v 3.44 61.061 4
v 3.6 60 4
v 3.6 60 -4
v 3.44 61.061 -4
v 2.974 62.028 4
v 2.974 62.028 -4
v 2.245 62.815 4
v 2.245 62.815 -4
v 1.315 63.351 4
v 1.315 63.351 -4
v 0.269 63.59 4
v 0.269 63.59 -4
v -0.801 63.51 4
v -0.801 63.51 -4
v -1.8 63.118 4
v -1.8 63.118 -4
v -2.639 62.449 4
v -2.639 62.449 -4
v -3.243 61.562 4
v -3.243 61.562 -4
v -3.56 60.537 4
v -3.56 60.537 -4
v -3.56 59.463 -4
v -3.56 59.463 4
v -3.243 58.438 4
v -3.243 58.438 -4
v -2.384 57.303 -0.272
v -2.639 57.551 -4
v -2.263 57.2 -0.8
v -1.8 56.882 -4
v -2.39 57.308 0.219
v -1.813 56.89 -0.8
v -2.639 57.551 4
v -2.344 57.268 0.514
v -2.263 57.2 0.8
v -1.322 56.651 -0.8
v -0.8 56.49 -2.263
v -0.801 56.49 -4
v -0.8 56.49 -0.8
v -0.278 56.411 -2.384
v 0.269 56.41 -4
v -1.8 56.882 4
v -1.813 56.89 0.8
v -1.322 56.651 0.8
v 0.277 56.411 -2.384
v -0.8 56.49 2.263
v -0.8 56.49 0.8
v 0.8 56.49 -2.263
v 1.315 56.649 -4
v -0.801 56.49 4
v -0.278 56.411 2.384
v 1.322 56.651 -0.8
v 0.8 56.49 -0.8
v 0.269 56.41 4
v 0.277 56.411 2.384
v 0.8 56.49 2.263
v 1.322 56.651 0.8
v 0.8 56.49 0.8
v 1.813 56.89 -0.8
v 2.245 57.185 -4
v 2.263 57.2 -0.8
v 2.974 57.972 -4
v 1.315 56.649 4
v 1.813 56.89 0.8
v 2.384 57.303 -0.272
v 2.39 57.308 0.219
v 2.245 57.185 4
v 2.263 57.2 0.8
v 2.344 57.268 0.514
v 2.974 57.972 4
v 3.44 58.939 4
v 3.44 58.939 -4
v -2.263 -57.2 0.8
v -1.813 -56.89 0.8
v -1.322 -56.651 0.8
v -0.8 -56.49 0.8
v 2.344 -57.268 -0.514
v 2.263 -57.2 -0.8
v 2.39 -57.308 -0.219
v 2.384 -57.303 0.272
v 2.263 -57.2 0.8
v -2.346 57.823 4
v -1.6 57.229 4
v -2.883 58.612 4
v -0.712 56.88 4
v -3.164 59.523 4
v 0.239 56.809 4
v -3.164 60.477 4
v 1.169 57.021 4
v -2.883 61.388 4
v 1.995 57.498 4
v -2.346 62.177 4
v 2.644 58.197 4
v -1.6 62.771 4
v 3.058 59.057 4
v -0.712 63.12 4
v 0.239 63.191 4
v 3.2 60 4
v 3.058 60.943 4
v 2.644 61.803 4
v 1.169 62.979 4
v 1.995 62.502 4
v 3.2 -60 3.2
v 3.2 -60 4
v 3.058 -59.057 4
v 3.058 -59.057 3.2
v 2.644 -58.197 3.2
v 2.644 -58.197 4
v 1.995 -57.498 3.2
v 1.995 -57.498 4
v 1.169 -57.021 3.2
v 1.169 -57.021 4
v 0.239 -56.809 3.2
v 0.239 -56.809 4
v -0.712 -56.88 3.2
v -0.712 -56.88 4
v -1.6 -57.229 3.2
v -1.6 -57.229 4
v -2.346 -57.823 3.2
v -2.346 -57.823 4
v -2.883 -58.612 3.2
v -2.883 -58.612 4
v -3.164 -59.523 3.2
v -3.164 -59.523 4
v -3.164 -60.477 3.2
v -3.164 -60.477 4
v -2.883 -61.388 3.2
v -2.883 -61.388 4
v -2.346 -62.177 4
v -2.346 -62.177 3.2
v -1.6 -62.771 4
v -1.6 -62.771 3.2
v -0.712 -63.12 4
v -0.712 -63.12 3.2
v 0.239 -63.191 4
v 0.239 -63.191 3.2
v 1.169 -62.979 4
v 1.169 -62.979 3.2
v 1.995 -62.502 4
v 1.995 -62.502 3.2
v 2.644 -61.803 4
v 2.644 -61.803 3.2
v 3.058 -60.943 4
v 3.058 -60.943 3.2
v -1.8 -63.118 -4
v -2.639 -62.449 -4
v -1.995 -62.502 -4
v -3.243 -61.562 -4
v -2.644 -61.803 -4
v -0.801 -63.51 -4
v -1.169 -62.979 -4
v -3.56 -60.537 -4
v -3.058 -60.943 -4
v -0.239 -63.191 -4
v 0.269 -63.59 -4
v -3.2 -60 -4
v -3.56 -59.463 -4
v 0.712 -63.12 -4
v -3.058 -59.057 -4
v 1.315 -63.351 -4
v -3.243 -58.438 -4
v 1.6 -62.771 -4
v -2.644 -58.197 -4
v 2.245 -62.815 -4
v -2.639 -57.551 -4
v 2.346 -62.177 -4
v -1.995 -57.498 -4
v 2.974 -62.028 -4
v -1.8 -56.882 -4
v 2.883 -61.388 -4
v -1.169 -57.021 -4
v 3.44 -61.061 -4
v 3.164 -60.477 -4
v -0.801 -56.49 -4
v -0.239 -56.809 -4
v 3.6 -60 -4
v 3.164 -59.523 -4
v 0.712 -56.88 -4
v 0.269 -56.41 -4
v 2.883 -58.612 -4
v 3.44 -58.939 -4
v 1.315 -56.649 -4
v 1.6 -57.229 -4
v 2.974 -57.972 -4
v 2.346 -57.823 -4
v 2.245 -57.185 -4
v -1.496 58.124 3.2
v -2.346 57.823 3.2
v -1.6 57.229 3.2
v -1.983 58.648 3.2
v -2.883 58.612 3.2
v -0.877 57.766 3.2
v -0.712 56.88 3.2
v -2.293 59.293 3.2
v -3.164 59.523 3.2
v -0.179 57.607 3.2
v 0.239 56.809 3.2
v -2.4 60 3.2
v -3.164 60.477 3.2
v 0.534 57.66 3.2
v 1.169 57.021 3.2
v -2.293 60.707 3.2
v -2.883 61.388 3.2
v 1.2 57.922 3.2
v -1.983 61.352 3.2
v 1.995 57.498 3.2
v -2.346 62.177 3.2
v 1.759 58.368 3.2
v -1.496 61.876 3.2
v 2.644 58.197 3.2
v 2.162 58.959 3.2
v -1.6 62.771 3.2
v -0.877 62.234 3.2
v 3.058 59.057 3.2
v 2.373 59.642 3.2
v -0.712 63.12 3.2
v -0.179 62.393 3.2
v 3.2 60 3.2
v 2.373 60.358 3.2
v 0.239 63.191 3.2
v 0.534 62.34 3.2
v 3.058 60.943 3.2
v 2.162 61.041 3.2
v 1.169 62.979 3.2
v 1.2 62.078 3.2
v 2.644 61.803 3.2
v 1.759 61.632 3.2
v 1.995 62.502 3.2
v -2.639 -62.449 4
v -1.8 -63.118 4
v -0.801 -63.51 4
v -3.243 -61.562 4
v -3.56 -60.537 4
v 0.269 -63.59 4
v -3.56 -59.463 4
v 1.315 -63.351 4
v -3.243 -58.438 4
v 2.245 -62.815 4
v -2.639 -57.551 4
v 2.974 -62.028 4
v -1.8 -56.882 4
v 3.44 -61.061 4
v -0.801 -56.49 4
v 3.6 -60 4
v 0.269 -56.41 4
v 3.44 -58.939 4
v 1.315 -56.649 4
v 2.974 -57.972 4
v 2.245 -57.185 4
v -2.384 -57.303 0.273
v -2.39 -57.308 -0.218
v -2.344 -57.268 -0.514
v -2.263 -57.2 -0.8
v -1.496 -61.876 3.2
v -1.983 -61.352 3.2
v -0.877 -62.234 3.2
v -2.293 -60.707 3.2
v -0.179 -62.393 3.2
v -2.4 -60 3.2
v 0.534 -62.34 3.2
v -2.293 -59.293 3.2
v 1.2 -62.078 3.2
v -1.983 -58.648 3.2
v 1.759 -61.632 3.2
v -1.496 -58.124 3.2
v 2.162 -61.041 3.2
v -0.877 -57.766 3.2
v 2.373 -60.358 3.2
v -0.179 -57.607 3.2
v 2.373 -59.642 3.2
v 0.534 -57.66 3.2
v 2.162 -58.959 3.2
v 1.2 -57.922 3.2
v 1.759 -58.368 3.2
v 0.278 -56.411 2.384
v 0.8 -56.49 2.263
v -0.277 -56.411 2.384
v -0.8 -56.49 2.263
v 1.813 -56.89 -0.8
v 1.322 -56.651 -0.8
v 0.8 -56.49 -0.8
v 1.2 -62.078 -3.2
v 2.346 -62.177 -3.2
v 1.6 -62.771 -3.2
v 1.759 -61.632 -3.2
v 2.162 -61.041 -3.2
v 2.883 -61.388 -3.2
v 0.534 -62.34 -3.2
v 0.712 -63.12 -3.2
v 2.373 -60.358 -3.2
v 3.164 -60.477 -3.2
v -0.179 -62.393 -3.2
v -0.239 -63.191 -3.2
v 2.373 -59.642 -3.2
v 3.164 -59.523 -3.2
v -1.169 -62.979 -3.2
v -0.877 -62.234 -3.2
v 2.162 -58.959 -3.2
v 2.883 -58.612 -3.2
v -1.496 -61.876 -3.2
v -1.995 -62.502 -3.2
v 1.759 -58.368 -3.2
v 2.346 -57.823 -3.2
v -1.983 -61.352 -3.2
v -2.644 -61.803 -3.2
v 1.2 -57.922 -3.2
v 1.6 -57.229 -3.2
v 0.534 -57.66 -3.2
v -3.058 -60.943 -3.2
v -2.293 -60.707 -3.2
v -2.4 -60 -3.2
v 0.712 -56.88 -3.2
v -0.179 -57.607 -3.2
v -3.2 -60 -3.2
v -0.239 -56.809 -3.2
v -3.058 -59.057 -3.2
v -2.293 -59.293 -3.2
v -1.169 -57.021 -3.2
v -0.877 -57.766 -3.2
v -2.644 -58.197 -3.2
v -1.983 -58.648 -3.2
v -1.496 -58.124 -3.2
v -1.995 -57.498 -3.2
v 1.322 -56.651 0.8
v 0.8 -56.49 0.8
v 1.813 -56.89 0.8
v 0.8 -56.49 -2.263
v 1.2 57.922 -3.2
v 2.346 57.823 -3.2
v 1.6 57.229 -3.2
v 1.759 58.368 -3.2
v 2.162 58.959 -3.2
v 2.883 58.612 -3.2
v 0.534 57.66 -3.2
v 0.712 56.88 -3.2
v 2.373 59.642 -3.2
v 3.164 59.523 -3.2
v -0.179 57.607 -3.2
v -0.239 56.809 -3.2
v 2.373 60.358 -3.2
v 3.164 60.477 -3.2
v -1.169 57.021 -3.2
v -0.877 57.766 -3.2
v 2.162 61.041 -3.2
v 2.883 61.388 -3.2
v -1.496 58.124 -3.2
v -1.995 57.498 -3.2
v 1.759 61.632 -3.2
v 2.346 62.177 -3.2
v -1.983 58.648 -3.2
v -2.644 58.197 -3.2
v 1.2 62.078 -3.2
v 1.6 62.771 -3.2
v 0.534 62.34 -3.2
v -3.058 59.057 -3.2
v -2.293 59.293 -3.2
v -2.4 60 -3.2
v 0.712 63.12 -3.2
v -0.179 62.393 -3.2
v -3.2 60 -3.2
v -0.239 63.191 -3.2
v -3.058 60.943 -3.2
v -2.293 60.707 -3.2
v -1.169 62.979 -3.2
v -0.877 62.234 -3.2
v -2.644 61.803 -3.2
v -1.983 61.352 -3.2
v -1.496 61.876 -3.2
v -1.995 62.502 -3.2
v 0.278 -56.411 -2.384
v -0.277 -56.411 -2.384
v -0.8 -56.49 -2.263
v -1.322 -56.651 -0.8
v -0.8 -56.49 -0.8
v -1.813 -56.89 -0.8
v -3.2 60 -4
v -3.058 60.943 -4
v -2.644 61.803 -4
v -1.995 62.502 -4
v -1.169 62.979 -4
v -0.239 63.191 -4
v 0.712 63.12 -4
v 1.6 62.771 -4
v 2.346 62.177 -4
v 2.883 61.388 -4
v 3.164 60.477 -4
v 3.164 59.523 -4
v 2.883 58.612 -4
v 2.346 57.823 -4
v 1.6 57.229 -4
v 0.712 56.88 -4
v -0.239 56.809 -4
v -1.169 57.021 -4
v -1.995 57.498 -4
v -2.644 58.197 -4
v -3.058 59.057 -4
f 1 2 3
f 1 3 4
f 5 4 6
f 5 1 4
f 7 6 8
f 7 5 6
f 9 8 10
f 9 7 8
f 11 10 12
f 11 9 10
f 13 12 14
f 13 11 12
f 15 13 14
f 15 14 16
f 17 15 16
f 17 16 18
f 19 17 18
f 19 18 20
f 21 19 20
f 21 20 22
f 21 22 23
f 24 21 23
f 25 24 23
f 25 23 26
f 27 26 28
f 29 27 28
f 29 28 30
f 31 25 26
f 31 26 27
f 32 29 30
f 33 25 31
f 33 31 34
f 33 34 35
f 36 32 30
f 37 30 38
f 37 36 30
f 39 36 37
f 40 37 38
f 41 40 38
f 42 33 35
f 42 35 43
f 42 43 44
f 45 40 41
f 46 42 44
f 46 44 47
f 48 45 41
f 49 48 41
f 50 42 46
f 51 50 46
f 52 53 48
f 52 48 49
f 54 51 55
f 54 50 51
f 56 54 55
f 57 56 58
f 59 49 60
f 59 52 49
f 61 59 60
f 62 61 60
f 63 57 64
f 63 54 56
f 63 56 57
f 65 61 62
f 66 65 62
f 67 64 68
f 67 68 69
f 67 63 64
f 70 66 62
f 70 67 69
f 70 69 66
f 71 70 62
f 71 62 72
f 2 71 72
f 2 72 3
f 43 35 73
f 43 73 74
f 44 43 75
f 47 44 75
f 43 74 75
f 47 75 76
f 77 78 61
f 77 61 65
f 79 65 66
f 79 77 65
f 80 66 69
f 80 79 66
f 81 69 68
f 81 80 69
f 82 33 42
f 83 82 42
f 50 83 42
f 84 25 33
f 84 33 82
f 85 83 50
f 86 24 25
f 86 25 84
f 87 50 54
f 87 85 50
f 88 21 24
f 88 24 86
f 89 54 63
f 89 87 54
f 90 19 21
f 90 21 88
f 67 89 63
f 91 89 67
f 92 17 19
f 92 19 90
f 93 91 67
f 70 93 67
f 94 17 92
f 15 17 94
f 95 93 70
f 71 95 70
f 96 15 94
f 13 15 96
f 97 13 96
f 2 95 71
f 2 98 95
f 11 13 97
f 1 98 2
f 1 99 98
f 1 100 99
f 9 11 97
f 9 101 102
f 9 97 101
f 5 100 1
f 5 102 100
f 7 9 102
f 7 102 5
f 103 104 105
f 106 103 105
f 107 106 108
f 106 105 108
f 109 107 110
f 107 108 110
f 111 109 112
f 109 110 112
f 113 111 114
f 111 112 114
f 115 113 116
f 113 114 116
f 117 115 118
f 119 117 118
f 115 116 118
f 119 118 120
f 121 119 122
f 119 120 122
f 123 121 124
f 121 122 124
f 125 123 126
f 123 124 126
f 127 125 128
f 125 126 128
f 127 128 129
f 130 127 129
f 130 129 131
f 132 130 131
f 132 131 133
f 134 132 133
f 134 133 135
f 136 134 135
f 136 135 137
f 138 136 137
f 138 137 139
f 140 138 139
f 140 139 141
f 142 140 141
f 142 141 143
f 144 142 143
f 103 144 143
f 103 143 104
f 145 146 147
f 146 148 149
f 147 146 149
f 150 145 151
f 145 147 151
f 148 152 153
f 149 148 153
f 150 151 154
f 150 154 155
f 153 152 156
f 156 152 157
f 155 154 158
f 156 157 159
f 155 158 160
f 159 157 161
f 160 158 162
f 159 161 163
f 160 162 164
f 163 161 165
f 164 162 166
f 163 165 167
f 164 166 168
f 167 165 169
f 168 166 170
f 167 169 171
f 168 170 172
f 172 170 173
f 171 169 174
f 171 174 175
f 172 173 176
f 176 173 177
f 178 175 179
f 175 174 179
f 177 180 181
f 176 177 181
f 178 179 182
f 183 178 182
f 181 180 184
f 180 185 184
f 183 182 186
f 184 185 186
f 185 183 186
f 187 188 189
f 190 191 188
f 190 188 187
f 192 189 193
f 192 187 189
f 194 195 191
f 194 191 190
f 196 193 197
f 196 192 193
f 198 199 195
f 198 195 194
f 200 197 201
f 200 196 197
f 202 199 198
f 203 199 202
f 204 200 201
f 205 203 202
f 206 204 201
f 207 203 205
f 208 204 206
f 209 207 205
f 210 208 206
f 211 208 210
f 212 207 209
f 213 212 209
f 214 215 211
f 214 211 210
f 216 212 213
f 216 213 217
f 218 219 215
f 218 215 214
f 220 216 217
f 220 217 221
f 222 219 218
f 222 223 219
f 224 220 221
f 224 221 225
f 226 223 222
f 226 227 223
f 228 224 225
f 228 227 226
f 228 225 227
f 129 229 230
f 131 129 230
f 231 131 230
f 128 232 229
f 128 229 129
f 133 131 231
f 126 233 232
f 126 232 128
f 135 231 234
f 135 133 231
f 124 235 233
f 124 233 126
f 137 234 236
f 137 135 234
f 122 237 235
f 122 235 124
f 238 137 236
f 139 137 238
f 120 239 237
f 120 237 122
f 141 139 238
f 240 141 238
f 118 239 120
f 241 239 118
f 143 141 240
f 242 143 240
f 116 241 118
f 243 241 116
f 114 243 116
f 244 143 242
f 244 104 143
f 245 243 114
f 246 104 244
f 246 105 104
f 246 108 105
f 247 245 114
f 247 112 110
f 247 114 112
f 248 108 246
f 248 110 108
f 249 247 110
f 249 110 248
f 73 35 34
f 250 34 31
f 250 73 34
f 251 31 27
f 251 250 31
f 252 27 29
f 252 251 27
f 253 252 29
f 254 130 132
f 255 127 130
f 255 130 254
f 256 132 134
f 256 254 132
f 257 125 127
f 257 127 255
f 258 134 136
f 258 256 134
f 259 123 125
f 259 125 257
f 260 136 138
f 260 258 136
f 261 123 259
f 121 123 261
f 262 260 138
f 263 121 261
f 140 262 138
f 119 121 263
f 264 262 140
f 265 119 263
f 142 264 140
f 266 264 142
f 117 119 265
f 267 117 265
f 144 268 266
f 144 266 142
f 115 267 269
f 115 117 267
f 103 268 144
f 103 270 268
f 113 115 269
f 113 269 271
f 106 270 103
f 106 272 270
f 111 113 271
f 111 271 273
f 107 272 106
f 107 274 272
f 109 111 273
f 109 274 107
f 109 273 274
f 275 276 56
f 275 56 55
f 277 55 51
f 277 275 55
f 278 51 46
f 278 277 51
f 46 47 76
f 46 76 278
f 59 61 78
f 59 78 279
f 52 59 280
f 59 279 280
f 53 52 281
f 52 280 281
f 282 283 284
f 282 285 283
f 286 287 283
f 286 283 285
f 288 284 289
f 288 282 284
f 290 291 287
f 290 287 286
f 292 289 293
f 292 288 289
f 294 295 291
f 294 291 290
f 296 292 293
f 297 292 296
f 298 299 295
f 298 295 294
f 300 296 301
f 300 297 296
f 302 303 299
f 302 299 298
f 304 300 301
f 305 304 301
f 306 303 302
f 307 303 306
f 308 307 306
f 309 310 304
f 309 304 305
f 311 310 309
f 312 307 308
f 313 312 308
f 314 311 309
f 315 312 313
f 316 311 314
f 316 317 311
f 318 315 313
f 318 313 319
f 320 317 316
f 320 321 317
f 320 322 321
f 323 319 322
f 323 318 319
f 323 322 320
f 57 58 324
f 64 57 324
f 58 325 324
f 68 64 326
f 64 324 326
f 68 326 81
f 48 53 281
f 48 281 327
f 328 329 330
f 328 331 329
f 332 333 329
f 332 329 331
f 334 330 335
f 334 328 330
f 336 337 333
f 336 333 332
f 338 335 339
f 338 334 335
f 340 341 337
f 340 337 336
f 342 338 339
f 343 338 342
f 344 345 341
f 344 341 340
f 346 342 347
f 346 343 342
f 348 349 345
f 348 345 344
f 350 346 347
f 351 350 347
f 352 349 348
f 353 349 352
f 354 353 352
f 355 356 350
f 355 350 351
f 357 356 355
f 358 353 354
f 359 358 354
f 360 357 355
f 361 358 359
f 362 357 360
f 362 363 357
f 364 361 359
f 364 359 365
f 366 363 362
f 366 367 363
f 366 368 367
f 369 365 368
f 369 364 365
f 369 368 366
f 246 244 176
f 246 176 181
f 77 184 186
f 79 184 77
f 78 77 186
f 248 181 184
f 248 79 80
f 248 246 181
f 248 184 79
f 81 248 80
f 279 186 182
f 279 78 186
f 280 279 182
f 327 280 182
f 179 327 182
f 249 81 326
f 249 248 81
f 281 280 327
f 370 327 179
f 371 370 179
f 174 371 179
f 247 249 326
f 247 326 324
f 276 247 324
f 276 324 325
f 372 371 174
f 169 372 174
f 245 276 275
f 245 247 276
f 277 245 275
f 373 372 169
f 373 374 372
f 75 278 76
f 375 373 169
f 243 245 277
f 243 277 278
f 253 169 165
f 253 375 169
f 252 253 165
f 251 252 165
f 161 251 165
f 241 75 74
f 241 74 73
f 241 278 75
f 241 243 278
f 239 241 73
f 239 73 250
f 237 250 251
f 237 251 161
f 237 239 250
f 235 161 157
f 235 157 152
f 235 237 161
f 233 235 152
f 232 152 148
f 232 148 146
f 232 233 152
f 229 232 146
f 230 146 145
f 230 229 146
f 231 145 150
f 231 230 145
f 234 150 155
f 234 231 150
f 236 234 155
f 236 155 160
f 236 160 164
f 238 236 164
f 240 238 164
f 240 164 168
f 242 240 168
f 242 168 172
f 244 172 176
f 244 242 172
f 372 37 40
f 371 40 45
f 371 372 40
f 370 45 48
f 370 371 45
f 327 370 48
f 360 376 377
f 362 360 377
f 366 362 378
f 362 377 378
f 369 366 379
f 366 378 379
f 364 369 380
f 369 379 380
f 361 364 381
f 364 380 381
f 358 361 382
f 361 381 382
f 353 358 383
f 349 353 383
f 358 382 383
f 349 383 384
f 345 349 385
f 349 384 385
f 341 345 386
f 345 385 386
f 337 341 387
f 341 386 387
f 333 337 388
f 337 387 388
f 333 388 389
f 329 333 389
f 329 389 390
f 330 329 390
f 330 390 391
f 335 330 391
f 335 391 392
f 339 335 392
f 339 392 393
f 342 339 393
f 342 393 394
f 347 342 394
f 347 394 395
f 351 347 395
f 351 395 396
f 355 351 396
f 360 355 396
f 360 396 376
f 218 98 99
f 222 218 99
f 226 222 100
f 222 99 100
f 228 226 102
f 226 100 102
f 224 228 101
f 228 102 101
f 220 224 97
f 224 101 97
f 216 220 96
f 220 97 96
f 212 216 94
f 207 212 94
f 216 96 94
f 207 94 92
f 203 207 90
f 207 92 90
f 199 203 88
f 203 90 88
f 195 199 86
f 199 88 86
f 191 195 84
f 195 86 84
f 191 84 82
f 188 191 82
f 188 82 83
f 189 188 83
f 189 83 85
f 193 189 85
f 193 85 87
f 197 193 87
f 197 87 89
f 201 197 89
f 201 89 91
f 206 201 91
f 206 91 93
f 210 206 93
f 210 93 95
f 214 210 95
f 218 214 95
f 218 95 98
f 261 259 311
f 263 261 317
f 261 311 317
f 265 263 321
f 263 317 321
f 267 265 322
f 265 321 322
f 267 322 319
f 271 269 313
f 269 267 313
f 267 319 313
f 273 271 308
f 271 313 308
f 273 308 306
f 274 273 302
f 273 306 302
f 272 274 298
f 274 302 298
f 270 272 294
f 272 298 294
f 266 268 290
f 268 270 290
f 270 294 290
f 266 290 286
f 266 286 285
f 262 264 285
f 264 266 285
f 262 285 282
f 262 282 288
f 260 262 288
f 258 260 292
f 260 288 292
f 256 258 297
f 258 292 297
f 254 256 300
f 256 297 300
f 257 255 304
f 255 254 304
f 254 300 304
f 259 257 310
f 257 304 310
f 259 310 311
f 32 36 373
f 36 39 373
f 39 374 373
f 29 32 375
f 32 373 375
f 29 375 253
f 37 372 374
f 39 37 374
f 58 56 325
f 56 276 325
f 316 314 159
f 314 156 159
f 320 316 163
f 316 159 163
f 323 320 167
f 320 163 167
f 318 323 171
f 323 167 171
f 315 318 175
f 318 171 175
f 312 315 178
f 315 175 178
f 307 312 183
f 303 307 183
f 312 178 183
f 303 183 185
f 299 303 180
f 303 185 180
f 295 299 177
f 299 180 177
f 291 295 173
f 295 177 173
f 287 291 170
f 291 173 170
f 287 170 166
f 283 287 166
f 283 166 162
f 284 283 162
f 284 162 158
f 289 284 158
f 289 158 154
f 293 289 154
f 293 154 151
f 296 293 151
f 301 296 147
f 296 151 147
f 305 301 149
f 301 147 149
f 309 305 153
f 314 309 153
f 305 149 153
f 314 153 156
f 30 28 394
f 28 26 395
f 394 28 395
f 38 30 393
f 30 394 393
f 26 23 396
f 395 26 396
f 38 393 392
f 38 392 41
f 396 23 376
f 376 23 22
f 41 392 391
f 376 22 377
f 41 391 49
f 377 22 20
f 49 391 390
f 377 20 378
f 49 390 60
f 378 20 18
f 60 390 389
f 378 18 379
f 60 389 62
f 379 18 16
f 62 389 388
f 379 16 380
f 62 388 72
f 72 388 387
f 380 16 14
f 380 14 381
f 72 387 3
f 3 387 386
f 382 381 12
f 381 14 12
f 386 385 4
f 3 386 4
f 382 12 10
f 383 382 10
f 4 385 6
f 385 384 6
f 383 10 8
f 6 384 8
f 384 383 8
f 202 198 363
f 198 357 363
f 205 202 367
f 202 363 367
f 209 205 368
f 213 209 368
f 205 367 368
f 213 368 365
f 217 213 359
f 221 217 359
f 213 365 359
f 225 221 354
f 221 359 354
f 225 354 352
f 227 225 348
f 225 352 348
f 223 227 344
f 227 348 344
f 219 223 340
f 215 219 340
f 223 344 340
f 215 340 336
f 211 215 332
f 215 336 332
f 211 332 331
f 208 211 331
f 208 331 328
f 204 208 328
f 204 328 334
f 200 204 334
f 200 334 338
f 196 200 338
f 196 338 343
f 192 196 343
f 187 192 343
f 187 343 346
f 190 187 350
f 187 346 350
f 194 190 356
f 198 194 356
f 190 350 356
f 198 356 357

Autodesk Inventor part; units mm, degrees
ref_plane "YZ Plane" through (0, 0, 0) normal (1, 0, 0) x (0, 1, 0)
ref_plane "XZ Plane" through (0, 0, 0) normal (0, 1, 0) x (-1, 0, 0)
ref_plane "XY Plane" through (0, 0, 0) normal (0, 0, 1) x (1, 0, 0)
sketch "Sketch2" plane through (0, 0, 0) normal (0, 1, 0) x (-1, 0, 0)
  circle A0 centre (0, 0) radius 2.4 construction
  line L0 (-0.8, 2.2627) -> (-0.8, 0.8)
  line L1 (-0.8, 0.8) -> (-2.2627, 0.8)
  line L2 (-2.2627, -0.8) -> (-0.8, -0.8)
  line L3 (-0.8, -0.8) -> (-0.8, -2.2627)
  line L4 (0.8, -2.2627) -> (0.8, -0.8)
  line L5 (0.8, -0.8) -> (2.2627, -0.8)
  line L6 (2.2627, 0.8) -> (0.8, 0.8)
  line L7 (0.8, 0.8) -> (0.8, 2.2627)
  arc A1 (0.8, 2.2627) -> (-0.8, 2.2627) centre (0, 0) ccw
  arc A2 (-2.2627, 0.8) -> (-2.2627, -0.8) centre (0, 0) ccw
  arc A3 (-0.8, -2.2627) -> (0.8, -2.2627) centre (0, 0) ccw
  arc A4 (2.2627, -0.8) -> (2.2627, 0.8) centre (0, 0) ccw
  dimension "d1" = 4.8
  dimension "d0" = 1.6
extrude "Extrusion1" add sketch "Sketch2" along normal mid plane 120
sketch "Sketch3" plane through (0, 0, 0) normal (0, 0, 1) x (1, 0, 0)
  line L0 (0.8, 60) -> (-0.8, 60) projected
  line L1 (-0.8, -60) -> (0.8, -60) projected
  circle A0 centre (0, 60) radius 3.6
  circle A1 centre (0, 60) radius 2.4
  circle A2 centre (0, -60) radius 3.6
  circle A3 centre (0, -60) radius 2.4
  point P0 (0, 0)
  dimension "d4" = 7.2
  dimension "d5" = 4.8
extrude "Extrusion2" add sketch "Sketch3" along normal mid plane 8 contours A0 | A1 | A2 | A3
sketch "Sketch4" plane through (0, 60, -4) normal (0, 0, -1) x (-1, 0, 0)
  circle A0 centre (0, 0) radius 3.6 projected
  circle A1 centre (0, 0) radius 2.4
  circle A2 centre (0, -120) radius 3.6 projected
  circle A3 centre (0, -120) radius 2.4
  point P0 (0, -3.6)
  point P1 (0, -60)
  dimension "d10" = 4.8
extrude "Extrusion4" cut sketch "Sketch4" against normal through all contours A1 | A3
sketch "Skizze6" plane through (0, 60, -4) normal (0, 0, -1) x (-1, 0, 0)
  circle A0 centre (0, 0) radius 2.4 projected
  circle A1 centre (0, 0) radius 3.6 projected
  circle A2 centre (0, 0) radius 3.2
  point P0 (0, -60)
  dimension "d26" = 6.4
extrude "Extrusion5" cut sketch "Skizze6" against normal blind 0.8 contours A2
pattern_circular "Circular Pattern1" count 2 over 360 about axis through (0, 0, 0) along (0, -1, 0) of "Extrusion5"
pattern_linear "Rectangular Pattern1" count 2 spacing 120 along (0, -1, 0) of "Circular Pattern1", "Extrusion5"
equation "\"d1\" = kd"
equation "\"d0\" = axlet"
equation "\"d2\" = 15 * lu"
equation "\"d4\" = tlad"
equation "\"d5\" = tpd"
equation "\"d6\" = lu"
equation "\"d10\" = tpd"
equation "\"d11\" = tsl"
equation "\"d26\" = tsd"
equation "\"d27\" = tsl"
equation "\"d25\" = 15 * lu"
equation "\"kd\" = 4.8"
equation "\"axlet\" = 1.6"
equation "\"lu\" = 8"
equation "\"tlad\" = 7.2"
equation "\"tpd\" = 4.8"
equation "\"tsl\" = 0.8"
equation "\"tsd\" = 6.4"
properties part number "2739a-Black" material "ABS Plastic"
